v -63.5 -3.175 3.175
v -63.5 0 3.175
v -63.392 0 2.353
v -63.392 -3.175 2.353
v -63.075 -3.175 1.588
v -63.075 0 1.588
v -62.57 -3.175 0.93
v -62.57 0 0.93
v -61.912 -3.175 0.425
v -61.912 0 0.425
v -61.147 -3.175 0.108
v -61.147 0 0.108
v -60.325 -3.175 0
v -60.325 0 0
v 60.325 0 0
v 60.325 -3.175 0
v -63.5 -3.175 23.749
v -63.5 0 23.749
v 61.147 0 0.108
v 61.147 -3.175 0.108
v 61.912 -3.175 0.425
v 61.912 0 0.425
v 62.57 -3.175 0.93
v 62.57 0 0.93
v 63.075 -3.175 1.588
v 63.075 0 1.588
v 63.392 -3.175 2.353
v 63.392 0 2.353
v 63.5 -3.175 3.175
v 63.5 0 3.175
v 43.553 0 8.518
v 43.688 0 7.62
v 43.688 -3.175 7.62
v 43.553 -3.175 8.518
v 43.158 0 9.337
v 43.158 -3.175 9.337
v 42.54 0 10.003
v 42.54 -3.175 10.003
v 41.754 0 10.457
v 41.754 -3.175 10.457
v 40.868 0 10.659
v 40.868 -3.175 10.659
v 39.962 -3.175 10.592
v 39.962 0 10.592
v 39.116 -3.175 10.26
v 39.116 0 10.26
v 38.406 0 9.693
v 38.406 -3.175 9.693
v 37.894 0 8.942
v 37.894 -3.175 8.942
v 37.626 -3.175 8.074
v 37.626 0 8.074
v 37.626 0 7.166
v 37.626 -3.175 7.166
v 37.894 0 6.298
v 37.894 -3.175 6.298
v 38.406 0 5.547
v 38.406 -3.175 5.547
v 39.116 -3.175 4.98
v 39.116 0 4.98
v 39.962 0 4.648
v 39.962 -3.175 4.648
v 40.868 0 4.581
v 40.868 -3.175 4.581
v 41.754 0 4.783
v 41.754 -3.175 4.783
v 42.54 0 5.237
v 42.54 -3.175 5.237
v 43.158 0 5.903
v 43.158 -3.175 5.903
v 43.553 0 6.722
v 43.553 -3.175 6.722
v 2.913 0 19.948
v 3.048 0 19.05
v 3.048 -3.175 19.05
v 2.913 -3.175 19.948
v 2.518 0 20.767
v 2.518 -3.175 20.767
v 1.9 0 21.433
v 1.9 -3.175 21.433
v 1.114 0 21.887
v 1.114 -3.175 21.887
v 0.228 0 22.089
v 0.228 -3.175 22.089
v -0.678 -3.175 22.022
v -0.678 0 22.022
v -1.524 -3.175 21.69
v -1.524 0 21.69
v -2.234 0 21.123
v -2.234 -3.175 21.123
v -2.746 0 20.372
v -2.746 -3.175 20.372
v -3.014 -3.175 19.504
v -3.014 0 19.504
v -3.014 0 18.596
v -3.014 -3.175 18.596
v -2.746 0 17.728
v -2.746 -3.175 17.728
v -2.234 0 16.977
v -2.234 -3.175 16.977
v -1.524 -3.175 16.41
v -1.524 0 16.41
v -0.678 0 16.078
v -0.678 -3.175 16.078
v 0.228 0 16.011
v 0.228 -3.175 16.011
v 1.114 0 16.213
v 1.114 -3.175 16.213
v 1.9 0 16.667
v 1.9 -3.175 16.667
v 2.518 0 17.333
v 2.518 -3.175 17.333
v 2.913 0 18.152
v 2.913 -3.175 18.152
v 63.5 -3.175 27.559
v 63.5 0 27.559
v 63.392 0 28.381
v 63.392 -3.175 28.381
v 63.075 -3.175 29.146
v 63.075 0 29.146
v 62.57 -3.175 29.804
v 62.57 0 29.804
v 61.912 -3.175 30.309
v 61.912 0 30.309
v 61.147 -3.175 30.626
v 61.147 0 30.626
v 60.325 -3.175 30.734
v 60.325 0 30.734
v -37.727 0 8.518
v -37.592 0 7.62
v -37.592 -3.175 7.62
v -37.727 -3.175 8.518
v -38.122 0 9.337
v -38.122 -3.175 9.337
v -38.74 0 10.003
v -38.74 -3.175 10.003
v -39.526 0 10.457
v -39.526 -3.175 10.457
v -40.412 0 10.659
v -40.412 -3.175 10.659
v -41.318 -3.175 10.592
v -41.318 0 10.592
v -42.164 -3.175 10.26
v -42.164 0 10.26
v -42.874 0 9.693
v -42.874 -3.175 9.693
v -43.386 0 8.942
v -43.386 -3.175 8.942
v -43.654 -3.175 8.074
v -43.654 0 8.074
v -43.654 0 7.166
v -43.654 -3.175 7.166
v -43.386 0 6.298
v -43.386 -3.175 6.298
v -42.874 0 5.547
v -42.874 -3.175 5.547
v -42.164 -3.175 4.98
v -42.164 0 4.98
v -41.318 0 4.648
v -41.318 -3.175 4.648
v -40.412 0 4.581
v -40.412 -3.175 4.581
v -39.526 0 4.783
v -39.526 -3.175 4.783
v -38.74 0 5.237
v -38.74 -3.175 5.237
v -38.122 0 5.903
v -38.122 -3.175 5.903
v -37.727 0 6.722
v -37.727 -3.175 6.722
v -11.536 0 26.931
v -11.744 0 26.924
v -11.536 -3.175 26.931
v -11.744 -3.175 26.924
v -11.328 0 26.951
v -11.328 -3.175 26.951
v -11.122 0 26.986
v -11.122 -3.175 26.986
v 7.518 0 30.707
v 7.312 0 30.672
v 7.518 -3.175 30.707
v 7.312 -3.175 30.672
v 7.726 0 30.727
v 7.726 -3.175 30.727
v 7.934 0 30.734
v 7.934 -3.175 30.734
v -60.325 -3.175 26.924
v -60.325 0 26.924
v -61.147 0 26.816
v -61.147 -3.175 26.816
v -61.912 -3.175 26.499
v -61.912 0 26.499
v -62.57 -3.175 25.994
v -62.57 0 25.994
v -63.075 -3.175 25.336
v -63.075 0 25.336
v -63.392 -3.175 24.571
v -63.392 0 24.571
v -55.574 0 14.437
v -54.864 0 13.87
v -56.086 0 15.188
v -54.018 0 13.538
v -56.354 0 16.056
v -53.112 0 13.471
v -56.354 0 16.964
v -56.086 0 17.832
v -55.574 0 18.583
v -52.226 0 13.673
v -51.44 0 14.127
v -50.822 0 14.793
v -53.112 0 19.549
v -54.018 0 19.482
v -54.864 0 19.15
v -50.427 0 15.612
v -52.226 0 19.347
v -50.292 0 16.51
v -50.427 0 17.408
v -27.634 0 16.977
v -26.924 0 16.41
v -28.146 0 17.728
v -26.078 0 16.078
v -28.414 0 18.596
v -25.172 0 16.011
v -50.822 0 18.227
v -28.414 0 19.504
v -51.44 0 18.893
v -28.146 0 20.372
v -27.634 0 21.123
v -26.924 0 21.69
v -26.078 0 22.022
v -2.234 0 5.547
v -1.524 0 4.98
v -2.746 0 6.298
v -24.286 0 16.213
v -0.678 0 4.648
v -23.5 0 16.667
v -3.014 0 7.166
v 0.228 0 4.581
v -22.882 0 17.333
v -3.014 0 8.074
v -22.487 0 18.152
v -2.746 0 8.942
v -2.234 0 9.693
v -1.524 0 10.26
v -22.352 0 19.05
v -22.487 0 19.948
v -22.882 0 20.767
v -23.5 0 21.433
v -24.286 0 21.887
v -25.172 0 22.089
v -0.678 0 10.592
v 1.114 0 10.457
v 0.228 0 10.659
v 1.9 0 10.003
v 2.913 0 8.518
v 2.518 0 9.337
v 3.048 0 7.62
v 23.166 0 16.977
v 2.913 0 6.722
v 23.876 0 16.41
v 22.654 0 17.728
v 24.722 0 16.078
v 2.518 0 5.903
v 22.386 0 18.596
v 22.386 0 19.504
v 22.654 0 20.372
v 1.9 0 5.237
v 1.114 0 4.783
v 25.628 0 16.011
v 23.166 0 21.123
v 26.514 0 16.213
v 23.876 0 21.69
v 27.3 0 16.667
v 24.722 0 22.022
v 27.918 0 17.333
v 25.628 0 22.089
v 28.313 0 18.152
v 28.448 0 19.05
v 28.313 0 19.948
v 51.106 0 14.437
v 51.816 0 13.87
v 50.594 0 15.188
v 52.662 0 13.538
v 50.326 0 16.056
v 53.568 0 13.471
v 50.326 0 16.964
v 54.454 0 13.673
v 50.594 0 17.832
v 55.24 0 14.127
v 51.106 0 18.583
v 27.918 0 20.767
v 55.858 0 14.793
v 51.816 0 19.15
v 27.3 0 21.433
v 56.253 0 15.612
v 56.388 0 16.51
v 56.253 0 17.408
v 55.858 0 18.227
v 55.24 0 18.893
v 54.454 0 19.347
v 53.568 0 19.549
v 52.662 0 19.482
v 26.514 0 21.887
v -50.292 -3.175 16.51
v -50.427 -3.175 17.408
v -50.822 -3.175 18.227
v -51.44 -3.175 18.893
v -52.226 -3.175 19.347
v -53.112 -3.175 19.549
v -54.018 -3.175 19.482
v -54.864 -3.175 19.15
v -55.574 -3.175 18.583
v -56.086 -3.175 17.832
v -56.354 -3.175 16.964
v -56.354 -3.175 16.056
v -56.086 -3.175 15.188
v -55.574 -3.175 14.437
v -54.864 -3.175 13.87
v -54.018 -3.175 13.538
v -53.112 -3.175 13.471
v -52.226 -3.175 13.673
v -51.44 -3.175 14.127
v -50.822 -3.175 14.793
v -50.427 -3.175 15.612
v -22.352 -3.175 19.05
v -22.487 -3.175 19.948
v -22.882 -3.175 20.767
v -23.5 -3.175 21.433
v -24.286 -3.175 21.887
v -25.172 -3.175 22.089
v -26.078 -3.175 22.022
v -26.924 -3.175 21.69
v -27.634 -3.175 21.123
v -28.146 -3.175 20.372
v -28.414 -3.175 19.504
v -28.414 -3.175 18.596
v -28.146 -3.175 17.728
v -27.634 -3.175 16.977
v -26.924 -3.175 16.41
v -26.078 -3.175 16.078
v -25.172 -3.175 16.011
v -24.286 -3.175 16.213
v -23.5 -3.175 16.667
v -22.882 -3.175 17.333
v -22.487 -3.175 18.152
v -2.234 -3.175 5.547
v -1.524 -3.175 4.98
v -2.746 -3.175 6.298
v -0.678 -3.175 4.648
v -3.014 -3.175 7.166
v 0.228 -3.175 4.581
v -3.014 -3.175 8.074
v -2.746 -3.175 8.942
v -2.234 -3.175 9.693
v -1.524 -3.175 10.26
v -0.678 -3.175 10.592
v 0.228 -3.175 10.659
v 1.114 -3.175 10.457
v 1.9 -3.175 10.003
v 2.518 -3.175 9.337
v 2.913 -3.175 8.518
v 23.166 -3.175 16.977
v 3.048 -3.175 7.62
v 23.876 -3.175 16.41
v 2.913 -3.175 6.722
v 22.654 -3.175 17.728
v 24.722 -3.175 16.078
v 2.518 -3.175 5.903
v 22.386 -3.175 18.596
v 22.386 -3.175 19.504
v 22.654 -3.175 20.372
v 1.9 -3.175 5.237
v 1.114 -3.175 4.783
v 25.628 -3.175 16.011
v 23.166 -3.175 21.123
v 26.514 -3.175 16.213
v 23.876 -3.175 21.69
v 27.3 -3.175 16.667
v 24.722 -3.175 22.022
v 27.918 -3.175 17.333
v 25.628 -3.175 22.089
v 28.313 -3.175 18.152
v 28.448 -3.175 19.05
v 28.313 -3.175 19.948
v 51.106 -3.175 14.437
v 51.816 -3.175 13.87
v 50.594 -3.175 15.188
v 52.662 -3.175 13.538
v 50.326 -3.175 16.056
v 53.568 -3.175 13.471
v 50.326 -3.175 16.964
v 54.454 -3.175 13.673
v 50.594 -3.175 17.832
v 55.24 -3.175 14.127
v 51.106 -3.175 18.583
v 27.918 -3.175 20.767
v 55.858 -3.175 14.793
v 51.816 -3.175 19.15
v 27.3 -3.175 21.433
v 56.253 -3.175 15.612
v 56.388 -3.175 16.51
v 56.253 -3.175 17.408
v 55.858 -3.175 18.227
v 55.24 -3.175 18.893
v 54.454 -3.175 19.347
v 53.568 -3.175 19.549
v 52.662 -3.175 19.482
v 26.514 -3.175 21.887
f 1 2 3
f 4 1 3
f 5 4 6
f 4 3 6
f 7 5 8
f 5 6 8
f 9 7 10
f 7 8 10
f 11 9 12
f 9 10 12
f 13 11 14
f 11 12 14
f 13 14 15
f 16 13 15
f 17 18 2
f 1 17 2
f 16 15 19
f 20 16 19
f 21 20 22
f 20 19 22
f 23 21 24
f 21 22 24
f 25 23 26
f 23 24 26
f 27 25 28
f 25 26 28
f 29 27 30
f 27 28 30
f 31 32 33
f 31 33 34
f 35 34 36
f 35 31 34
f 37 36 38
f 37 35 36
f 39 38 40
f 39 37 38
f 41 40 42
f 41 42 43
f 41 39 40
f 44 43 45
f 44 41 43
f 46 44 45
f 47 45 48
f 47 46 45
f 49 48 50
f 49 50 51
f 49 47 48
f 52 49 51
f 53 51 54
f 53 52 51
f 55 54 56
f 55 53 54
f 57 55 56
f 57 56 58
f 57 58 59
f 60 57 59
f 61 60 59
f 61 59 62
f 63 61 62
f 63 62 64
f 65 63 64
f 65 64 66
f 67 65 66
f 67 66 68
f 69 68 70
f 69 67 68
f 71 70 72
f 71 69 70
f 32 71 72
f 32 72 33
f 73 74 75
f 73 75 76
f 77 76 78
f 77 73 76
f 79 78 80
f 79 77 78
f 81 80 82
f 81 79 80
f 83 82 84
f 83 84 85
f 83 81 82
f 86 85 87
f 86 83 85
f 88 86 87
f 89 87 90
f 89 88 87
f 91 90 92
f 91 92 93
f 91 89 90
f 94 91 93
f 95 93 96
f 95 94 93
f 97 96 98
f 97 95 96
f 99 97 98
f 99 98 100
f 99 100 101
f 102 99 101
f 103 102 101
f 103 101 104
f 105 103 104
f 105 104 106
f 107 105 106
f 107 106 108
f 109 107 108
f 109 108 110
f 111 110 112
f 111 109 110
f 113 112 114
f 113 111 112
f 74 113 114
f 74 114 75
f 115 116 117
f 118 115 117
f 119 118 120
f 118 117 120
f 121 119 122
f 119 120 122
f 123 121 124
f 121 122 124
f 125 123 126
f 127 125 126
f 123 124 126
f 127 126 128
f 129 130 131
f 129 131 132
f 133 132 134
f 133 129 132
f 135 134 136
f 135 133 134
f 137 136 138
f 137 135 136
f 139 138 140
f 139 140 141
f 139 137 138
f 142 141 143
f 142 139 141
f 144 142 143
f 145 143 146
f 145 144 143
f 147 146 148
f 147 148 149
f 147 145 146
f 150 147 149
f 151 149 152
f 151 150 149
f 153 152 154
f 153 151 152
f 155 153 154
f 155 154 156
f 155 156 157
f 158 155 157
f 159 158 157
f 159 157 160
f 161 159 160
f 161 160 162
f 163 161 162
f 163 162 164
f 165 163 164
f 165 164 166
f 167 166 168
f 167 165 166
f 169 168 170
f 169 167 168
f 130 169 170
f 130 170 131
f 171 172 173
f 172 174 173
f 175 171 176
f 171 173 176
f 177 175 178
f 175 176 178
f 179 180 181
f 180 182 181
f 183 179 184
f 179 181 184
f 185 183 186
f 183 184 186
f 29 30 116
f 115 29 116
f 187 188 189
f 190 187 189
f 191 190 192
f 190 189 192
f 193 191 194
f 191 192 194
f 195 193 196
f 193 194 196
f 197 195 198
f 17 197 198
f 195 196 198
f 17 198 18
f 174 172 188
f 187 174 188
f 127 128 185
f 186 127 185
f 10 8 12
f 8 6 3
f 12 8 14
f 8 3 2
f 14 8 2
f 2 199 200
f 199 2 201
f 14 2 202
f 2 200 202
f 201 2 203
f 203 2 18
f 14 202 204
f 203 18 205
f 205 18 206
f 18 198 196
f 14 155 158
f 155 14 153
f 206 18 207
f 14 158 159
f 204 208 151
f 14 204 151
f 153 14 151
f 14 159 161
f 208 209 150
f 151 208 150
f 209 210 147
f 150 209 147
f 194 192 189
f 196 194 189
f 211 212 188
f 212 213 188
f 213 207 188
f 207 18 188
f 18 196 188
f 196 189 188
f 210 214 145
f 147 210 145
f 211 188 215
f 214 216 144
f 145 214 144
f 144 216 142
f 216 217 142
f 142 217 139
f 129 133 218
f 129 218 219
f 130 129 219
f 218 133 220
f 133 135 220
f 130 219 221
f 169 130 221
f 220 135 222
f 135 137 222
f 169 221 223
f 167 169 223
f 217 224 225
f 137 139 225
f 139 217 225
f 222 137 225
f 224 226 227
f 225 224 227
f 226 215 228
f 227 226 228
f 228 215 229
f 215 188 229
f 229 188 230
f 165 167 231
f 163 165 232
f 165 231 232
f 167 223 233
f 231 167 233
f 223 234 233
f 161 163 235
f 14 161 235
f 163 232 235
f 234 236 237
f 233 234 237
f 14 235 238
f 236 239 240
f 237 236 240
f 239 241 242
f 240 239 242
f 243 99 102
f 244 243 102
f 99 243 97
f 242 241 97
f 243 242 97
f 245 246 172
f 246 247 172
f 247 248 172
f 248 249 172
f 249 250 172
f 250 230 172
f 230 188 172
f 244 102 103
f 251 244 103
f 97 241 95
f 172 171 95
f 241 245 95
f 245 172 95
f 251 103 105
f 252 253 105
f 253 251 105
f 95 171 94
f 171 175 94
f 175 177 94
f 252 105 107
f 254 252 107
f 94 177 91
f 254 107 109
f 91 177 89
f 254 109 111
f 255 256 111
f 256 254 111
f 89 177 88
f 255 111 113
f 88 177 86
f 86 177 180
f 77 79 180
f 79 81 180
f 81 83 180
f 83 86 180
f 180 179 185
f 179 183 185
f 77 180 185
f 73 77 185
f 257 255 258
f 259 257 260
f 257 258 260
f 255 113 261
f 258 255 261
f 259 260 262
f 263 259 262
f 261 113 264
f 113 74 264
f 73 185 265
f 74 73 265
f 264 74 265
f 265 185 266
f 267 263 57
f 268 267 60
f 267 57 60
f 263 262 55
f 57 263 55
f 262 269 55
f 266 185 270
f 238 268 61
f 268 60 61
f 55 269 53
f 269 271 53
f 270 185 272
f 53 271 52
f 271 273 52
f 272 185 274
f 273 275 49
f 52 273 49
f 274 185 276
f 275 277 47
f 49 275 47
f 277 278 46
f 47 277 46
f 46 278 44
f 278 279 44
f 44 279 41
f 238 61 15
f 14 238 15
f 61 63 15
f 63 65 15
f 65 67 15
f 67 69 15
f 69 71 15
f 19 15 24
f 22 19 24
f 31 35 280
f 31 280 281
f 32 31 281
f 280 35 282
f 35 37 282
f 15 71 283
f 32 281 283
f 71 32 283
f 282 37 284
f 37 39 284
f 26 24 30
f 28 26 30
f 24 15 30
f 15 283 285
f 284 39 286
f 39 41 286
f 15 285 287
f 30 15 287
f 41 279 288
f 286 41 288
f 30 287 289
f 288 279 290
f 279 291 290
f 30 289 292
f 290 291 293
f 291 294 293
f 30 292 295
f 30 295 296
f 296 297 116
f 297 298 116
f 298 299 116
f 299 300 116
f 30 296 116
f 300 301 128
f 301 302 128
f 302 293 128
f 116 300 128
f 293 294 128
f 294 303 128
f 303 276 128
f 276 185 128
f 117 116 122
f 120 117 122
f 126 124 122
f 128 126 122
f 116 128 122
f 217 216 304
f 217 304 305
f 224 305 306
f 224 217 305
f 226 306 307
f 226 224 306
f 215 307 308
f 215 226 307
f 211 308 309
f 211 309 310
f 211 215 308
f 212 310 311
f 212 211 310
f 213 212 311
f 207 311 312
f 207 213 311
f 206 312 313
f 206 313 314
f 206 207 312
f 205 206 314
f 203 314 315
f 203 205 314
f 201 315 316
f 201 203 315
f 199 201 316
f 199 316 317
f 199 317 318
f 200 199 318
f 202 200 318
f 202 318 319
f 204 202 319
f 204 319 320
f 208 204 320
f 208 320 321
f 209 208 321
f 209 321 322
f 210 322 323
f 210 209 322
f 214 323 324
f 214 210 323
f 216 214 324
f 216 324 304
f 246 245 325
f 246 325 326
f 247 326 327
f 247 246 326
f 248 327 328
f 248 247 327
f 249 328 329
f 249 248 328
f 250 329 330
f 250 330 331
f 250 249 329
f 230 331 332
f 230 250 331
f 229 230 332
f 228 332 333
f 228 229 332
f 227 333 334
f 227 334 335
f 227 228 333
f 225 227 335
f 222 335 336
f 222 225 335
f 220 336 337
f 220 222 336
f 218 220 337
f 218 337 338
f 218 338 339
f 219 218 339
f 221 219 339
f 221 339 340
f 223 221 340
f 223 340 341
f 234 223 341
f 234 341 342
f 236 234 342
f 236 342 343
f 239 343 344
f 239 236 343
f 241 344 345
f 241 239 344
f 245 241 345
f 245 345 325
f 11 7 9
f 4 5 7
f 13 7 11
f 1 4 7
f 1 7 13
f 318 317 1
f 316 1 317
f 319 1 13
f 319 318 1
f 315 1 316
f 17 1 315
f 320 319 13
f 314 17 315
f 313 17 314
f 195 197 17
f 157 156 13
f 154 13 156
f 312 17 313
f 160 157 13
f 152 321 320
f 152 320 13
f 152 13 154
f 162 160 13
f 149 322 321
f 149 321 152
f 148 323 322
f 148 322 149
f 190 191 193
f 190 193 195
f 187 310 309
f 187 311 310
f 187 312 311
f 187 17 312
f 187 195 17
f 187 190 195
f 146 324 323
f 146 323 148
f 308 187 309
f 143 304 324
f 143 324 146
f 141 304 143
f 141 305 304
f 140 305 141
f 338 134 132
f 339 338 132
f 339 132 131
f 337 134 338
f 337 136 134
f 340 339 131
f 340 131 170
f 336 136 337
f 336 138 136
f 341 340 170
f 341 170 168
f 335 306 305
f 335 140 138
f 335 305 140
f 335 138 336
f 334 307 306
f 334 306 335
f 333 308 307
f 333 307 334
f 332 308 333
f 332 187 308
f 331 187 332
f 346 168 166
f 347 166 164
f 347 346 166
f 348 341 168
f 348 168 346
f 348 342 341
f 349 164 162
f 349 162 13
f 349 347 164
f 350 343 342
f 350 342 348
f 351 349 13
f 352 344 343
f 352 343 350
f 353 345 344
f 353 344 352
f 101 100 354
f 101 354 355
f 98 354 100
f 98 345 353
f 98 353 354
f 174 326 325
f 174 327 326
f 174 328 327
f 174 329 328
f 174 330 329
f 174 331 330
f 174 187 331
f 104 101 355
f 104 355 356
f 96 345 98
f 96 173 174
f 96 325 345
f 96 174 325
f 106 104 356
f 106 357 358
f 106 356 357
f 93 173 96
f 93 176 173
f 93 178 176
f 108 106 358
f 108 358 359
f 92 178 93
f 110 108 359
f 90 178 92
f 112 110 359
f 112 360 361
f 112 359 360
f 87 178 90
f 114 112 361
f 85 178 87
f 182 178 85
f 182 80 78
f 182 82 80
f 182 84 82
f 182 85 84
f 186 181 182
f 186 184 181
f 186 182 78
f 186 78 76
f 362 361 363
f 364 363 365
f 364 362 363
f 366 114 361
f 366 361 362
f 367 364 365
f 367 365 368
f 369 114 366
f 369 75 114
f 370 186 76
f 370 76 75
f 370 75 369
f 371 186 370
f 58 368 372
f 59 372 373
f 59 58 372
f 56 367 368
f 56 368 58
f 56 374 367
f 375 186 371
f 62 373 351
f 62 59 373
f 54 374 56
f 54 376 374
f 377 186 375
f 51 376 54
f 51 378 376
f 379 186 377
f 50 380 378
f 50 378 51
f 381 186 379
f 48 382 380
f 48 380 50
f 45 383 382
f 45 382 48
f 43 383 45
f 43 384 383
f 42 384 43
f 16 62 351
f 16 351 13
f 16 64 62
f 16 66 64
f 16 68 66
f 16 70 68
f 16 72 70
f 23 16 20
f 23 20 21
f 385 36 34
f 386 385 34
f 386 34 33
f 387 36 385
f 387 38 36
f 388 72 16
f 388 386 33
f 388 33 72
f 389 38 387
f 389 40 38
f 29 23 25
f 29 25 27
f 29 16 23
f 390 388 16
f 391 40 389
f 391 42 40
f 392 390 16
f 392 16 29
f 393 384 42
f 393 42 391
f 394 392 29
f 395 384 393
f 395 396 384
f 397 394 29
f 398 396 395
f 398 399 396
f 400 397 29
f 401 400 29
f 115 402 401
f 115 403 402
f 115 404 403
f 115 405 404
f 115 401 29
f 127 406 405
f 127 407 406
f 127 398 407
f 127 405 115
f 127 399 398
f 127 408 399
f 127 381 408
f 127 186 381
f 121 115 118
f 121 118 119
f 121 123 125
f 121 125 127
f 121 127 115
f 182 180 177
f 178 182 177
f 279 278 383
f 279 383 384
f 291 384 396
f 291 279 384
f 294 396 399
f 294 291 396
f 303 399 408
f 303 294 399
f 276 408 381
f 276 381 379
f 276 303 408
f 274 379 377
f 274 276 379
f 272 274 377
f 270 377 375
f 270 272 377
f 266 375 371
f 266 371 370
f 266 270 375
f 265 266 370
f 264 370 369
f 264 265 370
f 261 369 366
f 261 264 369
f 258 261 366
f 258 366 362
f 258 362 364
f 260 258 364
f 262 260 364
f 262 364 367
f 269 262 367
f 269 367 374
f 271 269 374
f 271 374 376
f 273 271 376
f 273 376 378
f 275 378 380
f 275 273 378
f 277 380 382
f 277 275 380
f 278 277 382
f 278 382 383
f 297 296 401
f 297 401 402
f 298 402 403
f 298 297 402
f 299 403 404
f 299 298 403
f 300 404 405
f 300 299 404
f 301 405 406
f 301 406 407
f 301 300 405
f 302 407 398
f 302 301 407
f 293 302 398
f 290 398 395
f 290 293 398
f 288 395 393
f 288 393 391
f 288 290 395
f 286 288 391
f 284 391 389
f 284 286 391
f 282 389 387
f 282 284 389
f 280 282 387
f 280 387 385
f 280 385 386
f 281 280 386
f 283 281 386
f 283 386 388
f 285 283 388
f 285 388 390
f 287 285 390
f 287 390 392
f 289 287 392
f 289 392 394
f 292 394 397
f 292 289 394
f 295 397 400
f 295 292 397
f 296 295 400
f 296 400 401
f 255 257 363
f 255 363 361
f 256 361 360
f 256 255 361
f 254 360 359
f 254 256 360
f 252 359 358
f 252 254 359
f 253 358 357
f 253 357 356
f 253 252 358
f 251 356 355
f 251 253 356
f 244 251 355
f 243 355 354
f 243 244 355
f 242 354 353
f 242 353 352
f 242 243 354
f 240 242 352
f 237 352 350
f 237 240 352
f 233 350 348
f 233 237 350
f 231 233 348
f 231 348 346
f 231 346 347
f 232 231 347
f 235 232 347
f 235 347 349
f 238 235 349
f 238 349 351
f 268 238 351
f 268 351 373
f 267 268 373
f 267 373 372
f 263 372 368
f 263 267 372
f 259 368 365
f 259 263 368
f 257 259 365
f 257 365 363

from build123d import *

# Parameters (mm, degrees)
F0_R     = 3.048
F1_DEPTH = 3.175
F2_R     = 3.175


with BuildPart() as f1:
    # F0 (on Front) → F1 (new body)
    with BuildSketch(Plane.XZ):
        with BuildLine():
            ThreePointArc((-63.5, 3.175), (-62.570064, 0.929936), (-60.325, 0))
            Line((-60.325, 0), (60.325, 0))
            ThreePointArc((60.325, 0), (62.570064, 0.929936), (63.5, 3.175))
            Line((63.5, 3.175), (63.5, 27.559))
            ThreePointArc((63.5, 27.559), (62.570064, 29.804064), (60.325, 30.734))
            Line((60.325, 30.734), (7.62, 30.734))
            Line((7.62, 30.734), (-11.43, 26.924))
            Line((-11.43, 26.924), (-60.325, 26.924))
            ThreePointArc((-60.325, 26.924), (-62.570064, 25.994064), (-63.5, 23.749))
            Line((-63.5, 23.749), (-63.5, 3.175))
        make_face()
        with Locations((-40.64, 7.62)):
            Circle(F0_R, mode=Mode.SUBTRACT)
        with Locations((0, 7.62)):
            Circle(F0_R, mode=Mode.SUBTRACT)
        with Locations((40.64, 7.62)):
            Circle(F0_R, mode=Mode.SUBTRACT)
        with Locations((-53.34, 16.51)):
            Circle(F0_R, mode=Mode.SUBTRACT)
        with Locations((-25.4, 19.05)):
            Circle(F0_R, mode=Mode.SUBTRACT)
        with Locations((0, 19.05)):
            Circle(F0_R, mode=Mode.SUBTRACT)
        with Locations((25.4, 19.05)):
            Circle(F0_R, mode=Mode.SUBTRACT)
        with Locations((53.34, 16.51)):
            Circle(F0_R, mode=Mode.SUBTRACT)
    extrude(amount=F1_DEPTH)

    # F2
    f2_edges = [f1.edges().sort_by_distance(p)[0] for p in [
        (-11.43, -1.5875, 26.924),
        (7.62, -1.5875, 30.734),
    ]]
    fillet(f2_edges, radius=F2_R)


solid = f1.part
